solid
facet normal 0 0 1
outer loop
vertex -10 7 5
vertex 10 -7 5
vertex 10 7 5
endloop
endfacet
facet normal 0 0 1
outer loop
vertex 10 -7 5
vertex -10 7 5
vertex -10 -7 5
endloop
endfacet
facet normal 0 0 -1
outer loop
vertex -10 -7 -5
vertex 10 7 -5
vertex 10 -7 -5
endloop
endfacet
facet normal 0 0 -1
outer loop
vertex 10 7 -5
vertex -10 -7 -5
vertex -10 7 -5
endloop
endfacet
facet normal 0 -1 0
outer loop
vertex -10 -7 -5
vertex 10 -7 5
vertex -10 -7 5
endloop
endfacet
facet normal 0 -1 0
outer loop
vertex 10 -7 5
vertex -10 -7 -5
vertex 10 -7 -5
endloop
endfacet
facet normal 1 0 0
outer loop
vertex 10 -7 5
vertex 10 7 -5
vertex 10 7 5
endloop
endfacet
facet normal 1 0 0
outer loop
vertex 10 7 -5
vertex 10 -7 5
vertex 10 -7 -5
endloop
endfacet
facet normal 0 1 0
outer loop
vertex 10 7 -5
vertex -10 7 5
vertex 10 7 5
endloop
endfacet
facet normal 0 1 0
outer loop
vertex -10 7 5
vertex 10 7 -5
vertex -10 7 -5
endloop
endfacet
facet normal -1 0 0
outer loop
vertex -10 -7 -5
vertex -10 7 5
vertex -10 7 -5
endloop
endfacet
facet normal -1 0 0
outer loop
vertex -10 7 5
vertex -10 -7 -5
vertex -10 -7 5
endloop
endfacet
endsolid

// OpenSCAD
// Auto-generated from tests/data/feature_fixtures_manifest.json
// fixture: box_plain
// fixture_type: box
// description: Baseline plain box with no holes or cutouts. Simplest positive box_like_solid case.
$fn = 96;

box_size = [20.000000, 14.000000, 10.000000];
box_origin = [-10.000000, -7.000000, -5.000000];

module through_hole_x(center, diameter, length) {
  translate([box_origin[0] - 0.1, center[1], center[2]])
    rotate(a=90, v=[0, 1, 0]) cylinder(d=diameter, h=length, center=false);
}

module through_hole_y(center, diameter, length) {
  translate([center[0], box_origin[1] - 0.1, center[2]])
    rotate(a=90, v=[-1, 0, 0]) cylinder(d=diameter, h=length, center=false);
}

module through_hole_z(center, diameter, length) {
  translate([center[0], center[1], box_origin[2] - 0.1])
    cylinder(d=diameter, h=length, center=false);
}

difference() {
  translate(box_origin) cube(box_size);
}
